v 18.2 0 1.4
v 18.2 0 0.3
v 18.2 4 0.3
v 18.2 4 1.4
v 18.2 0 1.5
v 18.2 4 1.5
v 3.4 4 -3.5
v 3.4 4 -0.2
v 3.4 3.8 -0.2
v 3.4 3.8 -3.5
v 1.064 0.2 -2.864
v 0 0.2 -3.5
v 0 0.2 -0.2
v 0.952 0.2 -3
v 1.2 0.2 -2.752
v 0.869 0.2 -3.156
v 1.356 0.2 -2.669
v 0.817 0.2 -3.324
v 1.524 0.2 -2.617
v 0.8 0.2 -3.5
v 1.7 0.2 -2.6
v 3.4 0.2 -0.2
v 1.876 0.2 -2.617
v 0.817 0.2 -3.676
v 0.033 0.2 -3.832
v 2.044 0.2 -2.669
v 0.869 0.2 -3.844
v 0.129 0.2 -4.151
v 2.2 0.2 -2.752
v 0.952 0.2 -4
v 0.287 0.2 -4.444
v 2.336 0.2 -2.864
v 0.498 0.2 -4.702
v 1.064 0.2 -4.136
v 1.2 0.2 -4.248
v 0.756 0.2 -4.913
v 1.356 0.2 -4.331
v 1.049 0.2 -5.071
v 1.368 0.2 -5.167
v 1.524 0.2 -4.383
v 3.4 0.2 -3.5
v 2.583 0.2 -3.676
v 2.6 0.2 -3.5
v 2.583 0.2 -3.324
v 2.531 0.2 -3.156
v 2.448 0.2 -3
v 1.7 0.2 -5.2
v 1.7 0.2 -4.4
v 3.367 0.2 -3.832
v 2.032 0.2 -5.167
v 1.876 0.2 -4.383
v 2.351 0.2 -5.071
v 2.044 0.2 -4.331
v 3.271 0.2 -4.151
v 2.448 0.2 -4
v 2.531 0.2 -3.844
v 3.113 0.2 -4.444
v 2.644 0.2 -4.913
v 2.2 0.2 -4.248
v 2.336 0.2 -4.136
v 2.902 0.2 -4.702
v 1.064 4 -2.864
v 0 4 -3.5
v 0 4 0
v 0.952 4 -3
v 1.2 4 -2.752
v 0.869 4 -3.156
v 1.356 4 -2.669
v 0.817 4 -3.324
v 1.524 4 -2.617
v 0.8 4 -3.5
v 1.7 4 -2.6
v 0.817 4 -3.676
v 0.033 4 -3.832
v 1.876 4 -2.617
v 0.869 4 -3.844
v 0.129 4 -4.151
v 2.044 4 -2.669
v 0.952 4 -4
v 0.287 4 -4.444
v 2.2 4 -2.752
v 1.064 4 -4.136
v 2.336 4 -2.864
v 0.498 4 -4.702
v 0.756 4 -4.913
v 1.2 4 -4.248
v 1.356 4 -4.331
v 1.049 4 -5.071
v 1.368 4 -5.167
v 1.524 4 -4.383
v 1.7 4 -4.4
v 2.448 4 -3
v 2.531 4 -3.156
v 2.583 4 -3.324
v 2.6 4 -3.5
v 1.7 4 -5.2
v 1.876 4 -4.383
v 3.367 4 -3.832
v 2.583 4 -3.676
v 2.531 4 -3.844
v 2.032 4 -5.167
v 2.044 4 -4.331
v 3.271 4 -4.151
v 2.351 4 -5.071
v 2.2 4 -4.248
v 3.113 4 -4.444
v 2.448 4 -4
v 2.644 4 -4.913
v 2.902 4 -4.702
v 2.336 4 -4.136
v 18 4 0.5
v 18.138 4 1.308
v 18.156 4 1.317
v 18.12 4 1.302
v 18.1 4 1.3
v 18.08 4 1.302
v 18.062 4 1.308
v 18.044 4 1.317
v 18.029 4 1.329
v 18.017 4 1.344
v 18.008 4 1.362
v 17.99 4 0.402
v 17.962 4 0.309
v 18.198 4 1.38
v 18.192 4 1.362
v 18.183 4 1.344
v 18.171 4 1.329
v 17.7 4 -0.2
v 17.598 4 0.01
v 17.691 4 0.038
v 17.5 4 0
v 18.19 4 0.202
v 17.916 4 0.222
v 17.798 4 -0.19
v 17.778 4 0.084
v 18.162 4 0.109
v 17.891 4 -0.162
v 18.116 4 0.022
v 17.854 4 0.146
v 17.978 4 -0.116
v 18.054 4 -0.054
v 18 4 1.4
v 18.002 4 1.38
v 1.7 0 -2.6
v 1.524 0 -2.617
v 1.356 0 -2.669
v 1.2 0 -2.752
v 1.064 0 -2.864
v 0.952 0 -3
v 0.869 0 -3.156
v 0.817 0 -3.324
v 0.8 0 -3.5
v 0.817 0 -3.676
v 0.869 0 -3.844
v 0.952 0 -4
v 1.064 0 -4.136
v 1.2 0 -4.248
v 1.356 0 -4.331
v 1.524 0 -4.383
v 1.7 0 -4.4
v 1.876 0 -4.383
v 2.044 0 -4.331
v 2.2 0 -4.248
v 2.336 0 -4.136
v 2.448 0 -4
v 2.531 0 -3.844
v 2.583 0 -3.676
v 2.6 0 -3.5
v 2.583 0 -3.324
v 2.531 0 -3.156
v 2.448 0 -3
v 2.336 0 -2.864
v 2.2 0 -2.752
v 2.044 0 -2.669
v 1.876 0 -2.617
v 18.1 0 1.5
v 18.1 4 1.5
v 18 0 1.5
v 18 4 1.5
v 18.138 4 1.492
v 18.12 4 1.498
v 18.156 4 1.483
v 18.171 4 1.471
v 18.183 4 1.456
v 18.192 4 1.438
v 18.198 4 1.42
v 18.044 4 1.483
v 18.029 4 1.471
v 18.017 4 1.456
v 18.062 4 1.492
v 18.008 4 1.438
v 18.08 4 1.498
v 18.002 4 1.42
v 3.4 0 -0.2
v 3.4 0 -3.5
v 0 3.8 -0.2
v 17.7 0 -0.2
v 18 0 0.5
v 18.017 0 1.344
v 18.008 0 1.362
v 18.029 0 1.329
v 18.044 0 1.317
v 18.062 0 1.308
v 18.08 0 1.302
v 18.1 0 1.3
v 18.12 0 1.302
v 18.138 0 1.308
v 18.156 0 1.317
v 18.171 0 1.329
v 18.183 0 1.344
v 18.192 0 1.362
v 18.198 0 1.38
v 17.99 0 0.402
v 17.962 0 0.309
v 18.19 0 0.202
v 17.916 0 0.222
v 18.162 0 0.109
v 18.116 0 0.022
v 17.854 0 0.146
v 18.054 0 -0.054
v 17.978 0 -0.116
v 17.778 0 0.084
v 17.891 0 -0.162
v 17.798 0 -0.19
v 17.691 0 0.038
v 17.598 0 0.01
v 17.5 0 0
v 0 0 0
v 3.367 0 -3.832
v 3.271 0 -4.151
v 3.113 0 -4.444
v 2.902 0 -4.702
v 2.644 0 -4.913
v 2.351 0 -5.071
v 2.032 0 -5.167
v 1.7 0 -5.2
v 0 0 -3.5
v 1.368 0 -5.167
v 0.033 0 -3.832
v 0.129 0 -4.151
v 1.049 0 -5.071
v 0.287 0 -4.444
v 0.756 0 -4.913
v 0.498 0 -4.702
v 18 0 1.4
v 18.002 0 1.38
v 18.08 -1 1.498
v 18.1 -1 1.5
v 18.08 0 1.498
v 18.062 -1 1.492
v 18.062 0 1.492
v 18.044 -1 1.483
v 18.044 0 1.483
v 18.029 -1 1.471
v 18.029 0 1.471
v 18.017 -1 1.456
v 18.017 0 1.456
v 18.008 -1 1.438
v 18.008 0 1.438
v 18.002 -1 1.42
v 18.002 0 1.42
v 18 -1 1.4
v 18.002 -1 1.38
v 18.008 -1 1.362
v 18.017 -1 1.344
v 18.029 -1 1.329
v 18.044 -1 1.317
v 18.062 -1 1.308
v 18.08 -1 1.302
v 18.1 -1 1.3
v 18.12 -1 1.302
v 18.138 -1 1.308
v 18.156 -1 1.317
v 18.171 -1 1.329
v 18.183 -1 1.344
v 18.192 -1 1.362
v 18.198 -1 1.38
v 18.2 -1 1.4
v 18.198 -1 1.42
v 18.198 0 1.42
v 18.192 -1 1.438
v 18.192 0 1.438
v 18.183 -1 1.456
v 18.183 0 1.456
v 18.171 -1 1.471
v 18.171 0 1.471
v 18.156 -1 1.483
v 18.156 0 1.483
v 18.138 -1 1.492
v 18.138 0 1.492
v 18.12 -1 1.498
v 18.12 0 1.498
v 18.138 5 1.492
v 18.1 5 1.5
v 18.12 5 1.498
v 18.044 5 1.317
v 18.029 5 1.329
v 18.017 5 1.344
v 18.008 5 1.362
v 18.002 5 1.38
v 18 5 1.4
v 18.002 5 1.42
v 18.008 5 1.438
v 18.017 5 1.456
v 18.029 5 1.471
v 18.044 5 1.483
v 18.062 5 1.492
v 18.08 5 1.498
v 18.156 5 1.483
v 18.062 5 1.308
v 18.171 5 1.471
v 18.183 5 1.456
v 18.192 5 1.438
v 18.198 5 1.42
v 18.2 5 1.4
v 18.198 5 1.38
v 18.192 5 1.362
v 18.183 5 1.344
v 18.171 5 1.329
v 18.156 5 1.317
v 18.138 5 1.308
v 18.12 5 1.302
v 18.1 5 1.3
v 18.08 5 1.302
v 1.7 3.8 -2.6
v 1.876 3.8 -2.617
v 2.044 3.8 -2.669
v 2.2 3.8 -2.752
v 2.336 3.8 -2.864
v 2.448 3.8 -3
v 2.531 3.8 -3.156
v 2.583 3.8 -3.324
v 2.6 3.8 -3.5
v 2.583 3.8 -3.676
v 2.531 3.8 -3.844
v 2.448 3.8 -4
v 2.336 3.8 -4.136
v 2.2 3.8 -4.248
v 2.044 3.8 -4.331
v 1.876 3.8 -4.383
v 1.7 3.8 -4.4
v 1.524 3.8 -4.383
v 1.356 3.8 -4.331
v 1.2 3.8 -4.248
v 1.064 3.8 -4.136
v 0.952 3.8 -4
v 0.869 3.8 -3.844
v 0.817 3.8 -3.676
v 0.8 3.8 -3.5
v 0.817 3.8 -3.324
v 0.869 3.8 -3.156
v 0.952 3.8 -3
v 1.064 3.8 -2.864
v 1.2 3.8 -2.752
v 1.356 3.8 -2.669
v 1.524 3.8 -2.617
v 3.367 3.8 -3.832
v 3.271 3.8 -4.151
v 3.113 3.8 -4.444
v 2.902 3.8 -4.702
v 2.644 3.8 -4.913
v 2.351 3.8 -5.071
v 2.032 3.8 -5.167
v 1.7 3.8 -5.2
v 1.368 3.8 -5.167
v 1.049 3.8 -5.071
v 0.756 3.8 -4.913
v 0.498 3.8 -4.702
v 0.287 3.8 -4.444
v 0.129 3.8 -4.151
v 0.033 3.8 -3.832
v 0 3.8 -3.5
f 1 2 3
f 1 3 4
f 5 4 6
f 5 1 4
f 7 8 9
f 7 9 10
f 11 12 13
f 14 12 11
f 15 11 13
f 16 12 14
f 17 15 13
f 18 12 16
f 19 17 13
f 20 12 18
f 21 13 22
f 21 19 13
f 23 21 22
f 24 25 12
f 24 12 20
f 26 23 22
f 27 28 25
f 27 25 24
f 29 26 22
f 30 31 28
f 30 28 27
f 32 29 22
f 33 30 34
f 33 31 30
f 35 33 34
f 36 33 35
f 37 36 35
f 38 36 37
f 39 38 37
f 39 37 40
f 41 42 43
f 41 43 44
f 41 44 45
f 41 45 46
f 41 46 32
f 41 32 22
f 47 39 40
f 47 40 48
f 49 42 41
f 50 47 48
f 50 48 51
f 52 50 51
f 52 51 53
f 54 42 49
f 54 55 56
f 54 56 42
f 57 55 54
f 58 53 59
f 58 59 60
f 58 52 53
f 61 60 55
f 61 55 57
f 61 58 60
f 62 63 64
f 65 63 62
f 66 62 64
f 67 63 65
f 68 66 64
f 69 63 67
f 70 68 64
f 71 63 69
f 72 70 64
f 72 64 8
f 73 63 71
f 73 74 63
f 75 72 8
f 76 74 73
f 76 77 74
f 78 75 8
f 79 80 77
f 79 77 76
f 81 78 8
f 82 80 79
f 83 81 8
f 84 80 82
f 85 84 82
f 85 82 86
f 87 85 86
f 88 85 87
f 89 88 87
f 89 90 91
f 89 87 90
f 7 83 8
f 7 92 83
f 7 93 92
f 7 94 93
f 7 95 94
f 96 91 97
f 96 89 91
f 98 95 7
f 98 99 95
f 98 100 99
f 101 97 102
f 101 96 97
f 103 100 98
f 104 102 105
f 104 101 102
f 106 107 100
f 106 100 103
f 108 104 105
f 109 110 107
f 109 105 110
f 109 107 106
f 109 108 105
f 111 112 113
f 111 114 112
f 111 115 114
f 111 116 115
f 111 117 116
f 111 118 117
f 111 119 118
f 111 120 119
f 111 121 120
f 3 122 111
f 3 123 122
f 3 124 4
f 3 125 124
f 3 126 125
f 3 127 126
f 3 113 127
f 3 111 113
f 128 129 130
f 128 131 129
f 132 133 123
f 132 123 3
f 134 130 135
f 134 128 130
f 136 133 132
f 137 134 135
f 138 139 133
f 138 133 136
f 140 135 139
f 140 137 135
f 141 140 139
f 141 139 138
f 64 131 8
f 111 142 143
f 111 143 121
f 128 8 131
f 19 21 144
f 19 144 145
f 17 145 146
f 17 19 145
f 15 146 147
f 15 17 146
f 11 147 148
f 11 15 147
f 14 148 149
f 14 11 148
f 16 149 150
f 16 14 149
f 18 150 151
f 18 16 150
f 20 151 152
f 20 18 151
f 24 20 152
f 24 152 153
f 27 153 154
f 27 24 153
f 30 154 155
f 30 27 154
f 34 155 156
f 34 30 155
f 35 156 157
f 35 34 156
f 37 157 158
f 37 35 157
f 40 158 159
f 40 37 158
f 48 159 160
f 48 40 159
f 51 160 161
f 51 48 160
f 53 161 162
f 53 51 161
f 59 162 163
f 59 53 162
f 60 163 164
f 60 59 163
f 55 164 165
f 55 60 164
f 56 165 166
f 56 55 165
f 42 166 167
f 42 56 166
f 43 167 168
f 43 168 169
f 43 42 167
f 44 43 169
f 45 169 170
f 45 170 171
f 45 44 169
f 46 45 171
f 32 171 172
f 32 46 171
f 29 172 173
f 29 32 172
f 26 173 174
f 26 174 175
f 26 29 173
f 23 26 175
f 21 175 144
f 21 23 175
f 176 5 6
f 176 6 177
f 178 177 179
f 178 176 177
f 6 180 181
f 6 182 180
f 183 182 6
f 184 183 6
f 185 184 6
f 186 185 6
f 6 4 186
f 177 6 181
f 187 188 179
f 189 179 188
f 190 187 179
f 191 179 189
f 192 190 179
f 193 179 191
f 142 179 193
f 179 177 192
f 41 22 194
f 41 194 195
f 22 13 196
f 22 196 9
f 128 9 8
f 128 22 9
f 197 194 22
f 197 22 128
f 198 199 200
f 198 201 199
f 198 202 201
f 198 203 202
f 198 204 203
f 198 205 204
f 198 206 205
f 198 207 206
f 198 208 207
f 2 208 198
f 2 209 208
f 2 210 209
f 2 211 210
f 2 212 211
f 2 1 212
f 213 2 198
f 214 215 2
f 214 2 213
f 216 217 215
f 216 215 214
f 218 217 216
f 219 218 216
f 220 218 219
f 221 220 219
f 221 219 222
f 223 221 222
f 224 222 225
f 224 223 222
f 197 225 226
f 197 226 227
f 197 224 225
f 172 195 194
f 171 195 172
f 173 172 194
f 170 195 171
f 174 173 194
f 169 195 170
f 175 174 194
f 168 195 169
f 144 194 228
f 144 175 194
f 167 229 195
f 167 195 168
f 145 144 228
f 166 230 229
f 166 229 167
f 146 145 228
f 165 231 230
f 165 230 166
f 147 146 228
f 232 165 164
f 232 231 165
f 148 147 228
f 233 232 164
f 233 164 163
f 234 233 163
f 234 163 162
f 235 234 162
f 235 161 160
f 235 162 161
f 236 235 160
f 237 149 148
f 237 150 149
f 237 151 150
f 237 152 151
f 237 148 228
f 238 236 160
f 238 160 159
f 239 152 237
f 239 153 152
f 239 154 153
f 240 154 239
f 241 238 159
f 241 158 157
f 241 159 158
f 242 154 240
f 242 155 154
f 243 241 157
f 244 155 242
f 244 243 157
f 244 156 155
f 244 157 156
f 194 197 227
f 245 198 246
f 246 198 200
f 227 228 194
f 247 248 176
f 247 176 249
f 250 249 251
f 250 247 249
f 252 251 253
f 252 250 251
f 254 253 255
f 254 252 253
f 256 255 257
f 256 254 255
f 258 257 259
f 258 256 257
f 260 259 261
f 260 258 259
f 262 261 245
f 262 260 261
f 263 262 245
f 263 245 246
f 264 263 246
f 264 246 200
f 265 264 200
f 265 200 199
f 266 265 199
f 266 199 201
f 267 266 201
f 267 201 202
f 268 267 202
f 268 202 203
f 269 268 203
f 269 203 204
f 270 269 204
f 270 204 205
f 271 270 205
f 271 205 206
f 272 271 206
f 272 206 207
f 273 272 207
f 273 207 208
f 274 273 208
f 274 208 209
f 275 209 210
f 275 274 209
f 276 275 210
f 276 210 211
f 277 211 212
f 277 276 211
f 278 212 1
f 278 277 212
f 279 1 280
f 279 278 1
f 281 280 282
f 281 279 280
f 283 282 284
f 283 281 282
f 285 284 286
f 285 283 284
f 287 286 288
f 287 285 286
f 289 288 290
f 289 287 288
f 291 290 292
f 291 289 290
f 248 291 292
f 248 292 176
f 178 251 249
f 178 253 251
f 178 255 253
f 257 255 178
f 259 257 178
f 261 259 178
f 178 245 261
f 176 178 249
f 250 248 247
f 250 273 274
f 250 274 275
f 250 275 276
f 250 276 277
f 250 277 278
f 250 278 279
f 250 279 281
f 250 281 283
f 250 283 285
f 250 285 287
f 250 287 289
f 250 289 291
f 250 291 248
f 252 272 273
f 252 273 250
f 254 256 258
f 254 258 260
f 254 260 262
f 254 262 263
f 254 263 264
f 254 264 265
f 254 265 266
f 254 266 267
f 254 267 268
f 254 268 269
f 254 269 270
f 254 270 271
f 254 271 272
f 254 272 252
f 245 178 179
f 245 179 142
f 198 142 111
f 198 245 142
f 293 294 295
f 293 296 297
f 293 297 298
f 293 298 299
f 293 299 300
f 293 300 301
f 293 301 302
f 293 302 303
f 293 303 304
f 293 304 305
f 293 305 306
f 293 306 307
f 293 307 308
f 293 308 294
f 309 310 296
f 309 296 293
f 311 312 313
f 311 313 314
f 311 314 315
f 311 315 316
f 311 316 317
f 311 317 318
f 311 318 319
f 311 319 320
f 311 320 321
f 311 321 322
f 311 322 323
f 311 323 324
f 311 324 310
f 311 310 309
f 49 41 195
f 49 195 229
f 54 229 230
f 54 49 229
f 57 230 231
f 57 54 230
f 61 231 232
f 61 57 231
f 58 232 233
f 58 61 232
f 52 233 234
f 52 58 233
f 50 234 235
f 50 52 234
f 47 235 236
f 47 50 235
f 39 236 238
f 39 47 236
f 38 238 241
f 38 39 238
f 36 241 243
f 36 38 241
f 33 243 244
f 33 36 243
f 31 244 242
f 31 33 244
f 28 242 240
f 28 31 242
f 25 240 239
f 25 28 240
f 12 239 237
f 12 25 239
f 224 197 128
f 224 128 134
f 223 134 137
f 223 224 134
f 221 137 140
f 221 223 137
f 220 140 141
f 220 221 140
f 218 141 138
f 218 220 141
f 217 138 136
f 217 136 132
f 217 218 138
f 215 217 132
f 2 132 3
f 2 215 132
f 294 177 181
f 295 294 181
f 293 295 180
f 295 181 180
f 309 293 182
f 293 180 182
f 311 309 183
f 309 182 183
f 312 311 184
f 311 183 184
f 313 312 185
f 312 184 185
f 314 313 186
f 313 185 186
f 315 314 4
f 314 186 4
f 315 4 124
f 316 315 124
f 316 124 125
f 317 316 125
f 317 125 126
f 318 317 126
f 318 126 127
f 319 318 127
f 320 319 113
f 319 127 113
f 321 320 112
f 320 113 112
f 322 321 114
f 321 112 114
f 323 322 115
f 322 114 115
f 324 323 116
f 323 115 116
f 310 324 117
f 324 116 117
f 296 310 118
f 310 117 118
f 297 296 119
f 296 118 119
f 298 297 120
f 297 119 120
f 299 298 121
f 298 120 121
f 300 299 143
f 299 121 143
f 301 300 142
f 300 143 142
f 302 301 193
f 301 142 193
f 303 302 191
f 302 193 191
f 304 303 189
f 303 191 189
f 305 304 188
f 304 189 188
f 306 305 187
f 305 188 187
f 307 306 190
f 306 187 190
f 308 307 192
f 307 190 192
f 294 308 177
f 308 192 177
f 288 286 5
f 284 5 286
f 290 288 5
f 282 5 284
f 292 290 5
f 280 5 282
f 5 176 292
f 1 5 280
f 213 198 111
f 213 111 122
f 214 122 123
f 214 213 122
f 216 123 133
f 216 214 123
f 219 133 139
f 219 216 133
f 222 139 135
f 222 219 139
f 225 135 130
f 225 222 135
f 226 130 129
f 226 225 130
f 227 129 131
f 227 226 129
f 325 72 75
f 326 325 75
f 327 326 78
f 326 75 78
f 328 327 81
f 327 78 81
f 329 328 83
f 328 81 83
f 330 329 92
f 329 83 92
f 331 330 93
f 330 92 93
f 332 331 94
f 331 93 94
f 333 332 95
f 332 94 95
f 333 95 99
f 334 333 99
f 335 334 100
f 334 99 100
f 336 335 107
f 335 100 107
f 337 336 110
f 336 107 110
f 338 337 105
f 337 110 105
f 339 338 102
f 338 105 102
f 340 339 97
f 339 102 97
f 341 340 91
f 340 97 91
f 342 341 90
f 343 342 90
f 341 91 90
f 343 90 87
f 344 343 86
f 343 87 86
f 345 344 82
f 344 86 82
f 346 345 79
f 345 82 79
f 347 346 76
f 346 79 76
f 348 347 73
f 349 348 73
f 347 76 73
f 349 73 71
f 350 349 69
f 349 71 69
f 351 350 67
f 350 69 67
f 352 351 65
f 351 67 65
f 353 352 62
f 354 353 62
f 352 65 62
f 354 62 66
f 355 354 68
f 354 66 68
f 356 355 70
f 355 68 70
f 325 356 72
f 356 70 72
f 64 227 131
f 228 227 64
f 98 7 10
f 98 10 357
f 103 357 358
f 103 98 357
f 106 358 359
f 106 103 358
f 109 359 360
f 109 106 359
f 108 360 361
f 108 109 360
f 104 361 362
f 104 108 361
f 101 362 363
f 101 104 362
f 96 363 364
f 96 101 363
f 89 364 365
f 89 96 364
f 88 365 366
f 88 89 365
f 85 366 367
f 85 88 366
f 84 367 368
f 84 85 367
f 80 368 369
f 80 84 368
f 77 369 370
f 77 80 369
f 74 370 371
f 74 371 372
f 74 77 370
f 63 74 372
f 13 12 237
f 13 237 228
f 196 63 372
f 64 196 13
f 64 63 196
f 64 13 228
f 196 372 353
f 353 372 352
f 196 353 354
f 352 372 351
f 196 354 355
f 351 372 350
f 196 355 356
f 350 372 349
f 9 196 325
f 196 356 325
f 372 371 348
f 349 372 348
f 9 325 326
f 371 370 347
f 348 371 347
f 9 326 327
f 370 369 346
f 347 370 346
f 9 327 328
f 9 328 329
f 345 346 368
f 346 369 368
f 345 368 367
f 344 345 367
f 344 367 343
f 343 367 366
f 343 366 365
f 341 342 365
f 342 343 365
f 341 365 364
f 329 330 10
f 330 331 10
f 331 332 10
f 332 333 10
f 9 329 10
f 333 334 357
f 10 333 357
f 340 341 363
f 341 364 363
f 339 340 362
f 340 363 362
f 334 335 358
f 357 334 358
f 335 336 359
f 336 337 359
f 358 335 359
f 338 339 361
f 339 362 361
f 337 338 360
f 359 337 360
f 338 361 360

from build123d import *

# Parameters (mm, degrees)
SALIENTE_EXTRUIR1_DEPTH = 4
CROQUIS2_R              = 0.9
SALIENTE_EXTRUIR3_DEPTH = 0.2
SALIENTE_EXTRUIR4_START = -0.2
CROQUIS3_R              = 0.9
SALIENTE_EXTRUIR4_DEPTH = 0.2
CROQUIS4_R              = 0.1
SALIENTE_EXTRUIR5_DEPTH = 1
SALIENTE_EXTRUIR6_START = 1
CROQUIS5_R              = 0.1
SALIENTE_EXTRUIR6_DEPTH = 1


with BuildPart() as part:
    # Croquis1 → Saliente-Extruir1 (new body)
    with BuildSketch(Plane(origin=(0, 0, 0), x_dir=(1, 0, 0), z_dir=(0, 1, 0))):
        with BuildLine():
            Line((18.2, -0.3), (18.2, -1.5))
            Line((18.2, -1.5), (18, -1.5))
            Line((18, -1.5), (18, -0.5))
            ThreePointArc((18, -0.5), (17.853553391, -0.146446609), (17.5, 0))
            Line((17.5, 0), (0, 0))
            Line((0, 0), (0, 0.2))
            Line((0, 0.2), (17.7, 0.2))
            ThreePointArc((17.7, 0.2), (18.053553391, 0.053553391), (18.2, -0.3))
        make_face()
    extrude(amount=SALIENTE_EXTRUIR1_DEPTH)

    # Croquis2 → Saliente-Extruir3 (add)
    with BuildSketch(Plane(origin=(0, 4, 0), x_dir=(1, 0, 0), z_dir=(0, 1, 0))):
        with BuildLine():
            Line((0, 0.2), (3.4, 0.2))
            Line((3.4, 0.2), (3.4, 3.5))
            ThreePointArc((3.4, 3.5), (1.7, 5.2), (0, 3.5))
            Line((0, 3.5), (0, 0.2))
        make_face()
        with Locations(Location((1.7, 3.5, 0), (0, 0, 270))):
            Circle(CROQUIS2_R, mode=Mode.SUBTRACT)
    extrude(amount=-SALIENTE_EXTRUIR3_DEPTH)

    # Croquis3 → Saliente-Extruir4 (add)
    with BuildSketch(Plane(origin=(0, 0, 0), x_dir=(-1, 0, 0), z_dir=(0, -1, 0)).offset(SALIENTE_EXTRUIR4_START)):
        with BuildLine():
            Line((0, 0), (-3.4, 0))
            Line((-3.4, 0), (-3.4, 3.5))
            ThreePointArc((-3.4, 3.5), (-1.7, 5.2), (0, 3.5))
            Line((0, 3.5), (0, 0))
        make_face()
        with Locations(Location((-1.7, 3.5, 0), (0, 0, 270))):
            Circle(CROQUIS3_R, mode=Mode.SUBTRACT)
    extrude(amount=SALIENTE_EXTRUIR4_DEPTH)

    # Croquis4 → Saliente-Extruir5 (add)
    with BuildSketch(Plane(origin=(0, 4, 0), x_dir=(1, 0, 0), z_dir=(0, 1, 0))):
        with Locations(Location((18.1, -1.4, 0), (0, 0, 270))):
            Circle(CROQUIS4_R)
    extrude(amount=SALIENTE_EXTRUIR5_DEPTH)

    # Croquis5 → Saliente-Extruir6 (add)
    with BuildSketch(Plane(origin=(0, 0, 0), x_dir=(-1, 0, 0), z_dir=(0, -1, 0)).offset(SALIENTE_EXTRUIR6_START)):
        with Locations(Location((-18.1, -1.4, 0), (0, 0, 270))):
            Circle(CROQUIS5_R)
    extrude(amount=-SALIENTE_EXTRUIR6_DEPTH)


solid = part.part
